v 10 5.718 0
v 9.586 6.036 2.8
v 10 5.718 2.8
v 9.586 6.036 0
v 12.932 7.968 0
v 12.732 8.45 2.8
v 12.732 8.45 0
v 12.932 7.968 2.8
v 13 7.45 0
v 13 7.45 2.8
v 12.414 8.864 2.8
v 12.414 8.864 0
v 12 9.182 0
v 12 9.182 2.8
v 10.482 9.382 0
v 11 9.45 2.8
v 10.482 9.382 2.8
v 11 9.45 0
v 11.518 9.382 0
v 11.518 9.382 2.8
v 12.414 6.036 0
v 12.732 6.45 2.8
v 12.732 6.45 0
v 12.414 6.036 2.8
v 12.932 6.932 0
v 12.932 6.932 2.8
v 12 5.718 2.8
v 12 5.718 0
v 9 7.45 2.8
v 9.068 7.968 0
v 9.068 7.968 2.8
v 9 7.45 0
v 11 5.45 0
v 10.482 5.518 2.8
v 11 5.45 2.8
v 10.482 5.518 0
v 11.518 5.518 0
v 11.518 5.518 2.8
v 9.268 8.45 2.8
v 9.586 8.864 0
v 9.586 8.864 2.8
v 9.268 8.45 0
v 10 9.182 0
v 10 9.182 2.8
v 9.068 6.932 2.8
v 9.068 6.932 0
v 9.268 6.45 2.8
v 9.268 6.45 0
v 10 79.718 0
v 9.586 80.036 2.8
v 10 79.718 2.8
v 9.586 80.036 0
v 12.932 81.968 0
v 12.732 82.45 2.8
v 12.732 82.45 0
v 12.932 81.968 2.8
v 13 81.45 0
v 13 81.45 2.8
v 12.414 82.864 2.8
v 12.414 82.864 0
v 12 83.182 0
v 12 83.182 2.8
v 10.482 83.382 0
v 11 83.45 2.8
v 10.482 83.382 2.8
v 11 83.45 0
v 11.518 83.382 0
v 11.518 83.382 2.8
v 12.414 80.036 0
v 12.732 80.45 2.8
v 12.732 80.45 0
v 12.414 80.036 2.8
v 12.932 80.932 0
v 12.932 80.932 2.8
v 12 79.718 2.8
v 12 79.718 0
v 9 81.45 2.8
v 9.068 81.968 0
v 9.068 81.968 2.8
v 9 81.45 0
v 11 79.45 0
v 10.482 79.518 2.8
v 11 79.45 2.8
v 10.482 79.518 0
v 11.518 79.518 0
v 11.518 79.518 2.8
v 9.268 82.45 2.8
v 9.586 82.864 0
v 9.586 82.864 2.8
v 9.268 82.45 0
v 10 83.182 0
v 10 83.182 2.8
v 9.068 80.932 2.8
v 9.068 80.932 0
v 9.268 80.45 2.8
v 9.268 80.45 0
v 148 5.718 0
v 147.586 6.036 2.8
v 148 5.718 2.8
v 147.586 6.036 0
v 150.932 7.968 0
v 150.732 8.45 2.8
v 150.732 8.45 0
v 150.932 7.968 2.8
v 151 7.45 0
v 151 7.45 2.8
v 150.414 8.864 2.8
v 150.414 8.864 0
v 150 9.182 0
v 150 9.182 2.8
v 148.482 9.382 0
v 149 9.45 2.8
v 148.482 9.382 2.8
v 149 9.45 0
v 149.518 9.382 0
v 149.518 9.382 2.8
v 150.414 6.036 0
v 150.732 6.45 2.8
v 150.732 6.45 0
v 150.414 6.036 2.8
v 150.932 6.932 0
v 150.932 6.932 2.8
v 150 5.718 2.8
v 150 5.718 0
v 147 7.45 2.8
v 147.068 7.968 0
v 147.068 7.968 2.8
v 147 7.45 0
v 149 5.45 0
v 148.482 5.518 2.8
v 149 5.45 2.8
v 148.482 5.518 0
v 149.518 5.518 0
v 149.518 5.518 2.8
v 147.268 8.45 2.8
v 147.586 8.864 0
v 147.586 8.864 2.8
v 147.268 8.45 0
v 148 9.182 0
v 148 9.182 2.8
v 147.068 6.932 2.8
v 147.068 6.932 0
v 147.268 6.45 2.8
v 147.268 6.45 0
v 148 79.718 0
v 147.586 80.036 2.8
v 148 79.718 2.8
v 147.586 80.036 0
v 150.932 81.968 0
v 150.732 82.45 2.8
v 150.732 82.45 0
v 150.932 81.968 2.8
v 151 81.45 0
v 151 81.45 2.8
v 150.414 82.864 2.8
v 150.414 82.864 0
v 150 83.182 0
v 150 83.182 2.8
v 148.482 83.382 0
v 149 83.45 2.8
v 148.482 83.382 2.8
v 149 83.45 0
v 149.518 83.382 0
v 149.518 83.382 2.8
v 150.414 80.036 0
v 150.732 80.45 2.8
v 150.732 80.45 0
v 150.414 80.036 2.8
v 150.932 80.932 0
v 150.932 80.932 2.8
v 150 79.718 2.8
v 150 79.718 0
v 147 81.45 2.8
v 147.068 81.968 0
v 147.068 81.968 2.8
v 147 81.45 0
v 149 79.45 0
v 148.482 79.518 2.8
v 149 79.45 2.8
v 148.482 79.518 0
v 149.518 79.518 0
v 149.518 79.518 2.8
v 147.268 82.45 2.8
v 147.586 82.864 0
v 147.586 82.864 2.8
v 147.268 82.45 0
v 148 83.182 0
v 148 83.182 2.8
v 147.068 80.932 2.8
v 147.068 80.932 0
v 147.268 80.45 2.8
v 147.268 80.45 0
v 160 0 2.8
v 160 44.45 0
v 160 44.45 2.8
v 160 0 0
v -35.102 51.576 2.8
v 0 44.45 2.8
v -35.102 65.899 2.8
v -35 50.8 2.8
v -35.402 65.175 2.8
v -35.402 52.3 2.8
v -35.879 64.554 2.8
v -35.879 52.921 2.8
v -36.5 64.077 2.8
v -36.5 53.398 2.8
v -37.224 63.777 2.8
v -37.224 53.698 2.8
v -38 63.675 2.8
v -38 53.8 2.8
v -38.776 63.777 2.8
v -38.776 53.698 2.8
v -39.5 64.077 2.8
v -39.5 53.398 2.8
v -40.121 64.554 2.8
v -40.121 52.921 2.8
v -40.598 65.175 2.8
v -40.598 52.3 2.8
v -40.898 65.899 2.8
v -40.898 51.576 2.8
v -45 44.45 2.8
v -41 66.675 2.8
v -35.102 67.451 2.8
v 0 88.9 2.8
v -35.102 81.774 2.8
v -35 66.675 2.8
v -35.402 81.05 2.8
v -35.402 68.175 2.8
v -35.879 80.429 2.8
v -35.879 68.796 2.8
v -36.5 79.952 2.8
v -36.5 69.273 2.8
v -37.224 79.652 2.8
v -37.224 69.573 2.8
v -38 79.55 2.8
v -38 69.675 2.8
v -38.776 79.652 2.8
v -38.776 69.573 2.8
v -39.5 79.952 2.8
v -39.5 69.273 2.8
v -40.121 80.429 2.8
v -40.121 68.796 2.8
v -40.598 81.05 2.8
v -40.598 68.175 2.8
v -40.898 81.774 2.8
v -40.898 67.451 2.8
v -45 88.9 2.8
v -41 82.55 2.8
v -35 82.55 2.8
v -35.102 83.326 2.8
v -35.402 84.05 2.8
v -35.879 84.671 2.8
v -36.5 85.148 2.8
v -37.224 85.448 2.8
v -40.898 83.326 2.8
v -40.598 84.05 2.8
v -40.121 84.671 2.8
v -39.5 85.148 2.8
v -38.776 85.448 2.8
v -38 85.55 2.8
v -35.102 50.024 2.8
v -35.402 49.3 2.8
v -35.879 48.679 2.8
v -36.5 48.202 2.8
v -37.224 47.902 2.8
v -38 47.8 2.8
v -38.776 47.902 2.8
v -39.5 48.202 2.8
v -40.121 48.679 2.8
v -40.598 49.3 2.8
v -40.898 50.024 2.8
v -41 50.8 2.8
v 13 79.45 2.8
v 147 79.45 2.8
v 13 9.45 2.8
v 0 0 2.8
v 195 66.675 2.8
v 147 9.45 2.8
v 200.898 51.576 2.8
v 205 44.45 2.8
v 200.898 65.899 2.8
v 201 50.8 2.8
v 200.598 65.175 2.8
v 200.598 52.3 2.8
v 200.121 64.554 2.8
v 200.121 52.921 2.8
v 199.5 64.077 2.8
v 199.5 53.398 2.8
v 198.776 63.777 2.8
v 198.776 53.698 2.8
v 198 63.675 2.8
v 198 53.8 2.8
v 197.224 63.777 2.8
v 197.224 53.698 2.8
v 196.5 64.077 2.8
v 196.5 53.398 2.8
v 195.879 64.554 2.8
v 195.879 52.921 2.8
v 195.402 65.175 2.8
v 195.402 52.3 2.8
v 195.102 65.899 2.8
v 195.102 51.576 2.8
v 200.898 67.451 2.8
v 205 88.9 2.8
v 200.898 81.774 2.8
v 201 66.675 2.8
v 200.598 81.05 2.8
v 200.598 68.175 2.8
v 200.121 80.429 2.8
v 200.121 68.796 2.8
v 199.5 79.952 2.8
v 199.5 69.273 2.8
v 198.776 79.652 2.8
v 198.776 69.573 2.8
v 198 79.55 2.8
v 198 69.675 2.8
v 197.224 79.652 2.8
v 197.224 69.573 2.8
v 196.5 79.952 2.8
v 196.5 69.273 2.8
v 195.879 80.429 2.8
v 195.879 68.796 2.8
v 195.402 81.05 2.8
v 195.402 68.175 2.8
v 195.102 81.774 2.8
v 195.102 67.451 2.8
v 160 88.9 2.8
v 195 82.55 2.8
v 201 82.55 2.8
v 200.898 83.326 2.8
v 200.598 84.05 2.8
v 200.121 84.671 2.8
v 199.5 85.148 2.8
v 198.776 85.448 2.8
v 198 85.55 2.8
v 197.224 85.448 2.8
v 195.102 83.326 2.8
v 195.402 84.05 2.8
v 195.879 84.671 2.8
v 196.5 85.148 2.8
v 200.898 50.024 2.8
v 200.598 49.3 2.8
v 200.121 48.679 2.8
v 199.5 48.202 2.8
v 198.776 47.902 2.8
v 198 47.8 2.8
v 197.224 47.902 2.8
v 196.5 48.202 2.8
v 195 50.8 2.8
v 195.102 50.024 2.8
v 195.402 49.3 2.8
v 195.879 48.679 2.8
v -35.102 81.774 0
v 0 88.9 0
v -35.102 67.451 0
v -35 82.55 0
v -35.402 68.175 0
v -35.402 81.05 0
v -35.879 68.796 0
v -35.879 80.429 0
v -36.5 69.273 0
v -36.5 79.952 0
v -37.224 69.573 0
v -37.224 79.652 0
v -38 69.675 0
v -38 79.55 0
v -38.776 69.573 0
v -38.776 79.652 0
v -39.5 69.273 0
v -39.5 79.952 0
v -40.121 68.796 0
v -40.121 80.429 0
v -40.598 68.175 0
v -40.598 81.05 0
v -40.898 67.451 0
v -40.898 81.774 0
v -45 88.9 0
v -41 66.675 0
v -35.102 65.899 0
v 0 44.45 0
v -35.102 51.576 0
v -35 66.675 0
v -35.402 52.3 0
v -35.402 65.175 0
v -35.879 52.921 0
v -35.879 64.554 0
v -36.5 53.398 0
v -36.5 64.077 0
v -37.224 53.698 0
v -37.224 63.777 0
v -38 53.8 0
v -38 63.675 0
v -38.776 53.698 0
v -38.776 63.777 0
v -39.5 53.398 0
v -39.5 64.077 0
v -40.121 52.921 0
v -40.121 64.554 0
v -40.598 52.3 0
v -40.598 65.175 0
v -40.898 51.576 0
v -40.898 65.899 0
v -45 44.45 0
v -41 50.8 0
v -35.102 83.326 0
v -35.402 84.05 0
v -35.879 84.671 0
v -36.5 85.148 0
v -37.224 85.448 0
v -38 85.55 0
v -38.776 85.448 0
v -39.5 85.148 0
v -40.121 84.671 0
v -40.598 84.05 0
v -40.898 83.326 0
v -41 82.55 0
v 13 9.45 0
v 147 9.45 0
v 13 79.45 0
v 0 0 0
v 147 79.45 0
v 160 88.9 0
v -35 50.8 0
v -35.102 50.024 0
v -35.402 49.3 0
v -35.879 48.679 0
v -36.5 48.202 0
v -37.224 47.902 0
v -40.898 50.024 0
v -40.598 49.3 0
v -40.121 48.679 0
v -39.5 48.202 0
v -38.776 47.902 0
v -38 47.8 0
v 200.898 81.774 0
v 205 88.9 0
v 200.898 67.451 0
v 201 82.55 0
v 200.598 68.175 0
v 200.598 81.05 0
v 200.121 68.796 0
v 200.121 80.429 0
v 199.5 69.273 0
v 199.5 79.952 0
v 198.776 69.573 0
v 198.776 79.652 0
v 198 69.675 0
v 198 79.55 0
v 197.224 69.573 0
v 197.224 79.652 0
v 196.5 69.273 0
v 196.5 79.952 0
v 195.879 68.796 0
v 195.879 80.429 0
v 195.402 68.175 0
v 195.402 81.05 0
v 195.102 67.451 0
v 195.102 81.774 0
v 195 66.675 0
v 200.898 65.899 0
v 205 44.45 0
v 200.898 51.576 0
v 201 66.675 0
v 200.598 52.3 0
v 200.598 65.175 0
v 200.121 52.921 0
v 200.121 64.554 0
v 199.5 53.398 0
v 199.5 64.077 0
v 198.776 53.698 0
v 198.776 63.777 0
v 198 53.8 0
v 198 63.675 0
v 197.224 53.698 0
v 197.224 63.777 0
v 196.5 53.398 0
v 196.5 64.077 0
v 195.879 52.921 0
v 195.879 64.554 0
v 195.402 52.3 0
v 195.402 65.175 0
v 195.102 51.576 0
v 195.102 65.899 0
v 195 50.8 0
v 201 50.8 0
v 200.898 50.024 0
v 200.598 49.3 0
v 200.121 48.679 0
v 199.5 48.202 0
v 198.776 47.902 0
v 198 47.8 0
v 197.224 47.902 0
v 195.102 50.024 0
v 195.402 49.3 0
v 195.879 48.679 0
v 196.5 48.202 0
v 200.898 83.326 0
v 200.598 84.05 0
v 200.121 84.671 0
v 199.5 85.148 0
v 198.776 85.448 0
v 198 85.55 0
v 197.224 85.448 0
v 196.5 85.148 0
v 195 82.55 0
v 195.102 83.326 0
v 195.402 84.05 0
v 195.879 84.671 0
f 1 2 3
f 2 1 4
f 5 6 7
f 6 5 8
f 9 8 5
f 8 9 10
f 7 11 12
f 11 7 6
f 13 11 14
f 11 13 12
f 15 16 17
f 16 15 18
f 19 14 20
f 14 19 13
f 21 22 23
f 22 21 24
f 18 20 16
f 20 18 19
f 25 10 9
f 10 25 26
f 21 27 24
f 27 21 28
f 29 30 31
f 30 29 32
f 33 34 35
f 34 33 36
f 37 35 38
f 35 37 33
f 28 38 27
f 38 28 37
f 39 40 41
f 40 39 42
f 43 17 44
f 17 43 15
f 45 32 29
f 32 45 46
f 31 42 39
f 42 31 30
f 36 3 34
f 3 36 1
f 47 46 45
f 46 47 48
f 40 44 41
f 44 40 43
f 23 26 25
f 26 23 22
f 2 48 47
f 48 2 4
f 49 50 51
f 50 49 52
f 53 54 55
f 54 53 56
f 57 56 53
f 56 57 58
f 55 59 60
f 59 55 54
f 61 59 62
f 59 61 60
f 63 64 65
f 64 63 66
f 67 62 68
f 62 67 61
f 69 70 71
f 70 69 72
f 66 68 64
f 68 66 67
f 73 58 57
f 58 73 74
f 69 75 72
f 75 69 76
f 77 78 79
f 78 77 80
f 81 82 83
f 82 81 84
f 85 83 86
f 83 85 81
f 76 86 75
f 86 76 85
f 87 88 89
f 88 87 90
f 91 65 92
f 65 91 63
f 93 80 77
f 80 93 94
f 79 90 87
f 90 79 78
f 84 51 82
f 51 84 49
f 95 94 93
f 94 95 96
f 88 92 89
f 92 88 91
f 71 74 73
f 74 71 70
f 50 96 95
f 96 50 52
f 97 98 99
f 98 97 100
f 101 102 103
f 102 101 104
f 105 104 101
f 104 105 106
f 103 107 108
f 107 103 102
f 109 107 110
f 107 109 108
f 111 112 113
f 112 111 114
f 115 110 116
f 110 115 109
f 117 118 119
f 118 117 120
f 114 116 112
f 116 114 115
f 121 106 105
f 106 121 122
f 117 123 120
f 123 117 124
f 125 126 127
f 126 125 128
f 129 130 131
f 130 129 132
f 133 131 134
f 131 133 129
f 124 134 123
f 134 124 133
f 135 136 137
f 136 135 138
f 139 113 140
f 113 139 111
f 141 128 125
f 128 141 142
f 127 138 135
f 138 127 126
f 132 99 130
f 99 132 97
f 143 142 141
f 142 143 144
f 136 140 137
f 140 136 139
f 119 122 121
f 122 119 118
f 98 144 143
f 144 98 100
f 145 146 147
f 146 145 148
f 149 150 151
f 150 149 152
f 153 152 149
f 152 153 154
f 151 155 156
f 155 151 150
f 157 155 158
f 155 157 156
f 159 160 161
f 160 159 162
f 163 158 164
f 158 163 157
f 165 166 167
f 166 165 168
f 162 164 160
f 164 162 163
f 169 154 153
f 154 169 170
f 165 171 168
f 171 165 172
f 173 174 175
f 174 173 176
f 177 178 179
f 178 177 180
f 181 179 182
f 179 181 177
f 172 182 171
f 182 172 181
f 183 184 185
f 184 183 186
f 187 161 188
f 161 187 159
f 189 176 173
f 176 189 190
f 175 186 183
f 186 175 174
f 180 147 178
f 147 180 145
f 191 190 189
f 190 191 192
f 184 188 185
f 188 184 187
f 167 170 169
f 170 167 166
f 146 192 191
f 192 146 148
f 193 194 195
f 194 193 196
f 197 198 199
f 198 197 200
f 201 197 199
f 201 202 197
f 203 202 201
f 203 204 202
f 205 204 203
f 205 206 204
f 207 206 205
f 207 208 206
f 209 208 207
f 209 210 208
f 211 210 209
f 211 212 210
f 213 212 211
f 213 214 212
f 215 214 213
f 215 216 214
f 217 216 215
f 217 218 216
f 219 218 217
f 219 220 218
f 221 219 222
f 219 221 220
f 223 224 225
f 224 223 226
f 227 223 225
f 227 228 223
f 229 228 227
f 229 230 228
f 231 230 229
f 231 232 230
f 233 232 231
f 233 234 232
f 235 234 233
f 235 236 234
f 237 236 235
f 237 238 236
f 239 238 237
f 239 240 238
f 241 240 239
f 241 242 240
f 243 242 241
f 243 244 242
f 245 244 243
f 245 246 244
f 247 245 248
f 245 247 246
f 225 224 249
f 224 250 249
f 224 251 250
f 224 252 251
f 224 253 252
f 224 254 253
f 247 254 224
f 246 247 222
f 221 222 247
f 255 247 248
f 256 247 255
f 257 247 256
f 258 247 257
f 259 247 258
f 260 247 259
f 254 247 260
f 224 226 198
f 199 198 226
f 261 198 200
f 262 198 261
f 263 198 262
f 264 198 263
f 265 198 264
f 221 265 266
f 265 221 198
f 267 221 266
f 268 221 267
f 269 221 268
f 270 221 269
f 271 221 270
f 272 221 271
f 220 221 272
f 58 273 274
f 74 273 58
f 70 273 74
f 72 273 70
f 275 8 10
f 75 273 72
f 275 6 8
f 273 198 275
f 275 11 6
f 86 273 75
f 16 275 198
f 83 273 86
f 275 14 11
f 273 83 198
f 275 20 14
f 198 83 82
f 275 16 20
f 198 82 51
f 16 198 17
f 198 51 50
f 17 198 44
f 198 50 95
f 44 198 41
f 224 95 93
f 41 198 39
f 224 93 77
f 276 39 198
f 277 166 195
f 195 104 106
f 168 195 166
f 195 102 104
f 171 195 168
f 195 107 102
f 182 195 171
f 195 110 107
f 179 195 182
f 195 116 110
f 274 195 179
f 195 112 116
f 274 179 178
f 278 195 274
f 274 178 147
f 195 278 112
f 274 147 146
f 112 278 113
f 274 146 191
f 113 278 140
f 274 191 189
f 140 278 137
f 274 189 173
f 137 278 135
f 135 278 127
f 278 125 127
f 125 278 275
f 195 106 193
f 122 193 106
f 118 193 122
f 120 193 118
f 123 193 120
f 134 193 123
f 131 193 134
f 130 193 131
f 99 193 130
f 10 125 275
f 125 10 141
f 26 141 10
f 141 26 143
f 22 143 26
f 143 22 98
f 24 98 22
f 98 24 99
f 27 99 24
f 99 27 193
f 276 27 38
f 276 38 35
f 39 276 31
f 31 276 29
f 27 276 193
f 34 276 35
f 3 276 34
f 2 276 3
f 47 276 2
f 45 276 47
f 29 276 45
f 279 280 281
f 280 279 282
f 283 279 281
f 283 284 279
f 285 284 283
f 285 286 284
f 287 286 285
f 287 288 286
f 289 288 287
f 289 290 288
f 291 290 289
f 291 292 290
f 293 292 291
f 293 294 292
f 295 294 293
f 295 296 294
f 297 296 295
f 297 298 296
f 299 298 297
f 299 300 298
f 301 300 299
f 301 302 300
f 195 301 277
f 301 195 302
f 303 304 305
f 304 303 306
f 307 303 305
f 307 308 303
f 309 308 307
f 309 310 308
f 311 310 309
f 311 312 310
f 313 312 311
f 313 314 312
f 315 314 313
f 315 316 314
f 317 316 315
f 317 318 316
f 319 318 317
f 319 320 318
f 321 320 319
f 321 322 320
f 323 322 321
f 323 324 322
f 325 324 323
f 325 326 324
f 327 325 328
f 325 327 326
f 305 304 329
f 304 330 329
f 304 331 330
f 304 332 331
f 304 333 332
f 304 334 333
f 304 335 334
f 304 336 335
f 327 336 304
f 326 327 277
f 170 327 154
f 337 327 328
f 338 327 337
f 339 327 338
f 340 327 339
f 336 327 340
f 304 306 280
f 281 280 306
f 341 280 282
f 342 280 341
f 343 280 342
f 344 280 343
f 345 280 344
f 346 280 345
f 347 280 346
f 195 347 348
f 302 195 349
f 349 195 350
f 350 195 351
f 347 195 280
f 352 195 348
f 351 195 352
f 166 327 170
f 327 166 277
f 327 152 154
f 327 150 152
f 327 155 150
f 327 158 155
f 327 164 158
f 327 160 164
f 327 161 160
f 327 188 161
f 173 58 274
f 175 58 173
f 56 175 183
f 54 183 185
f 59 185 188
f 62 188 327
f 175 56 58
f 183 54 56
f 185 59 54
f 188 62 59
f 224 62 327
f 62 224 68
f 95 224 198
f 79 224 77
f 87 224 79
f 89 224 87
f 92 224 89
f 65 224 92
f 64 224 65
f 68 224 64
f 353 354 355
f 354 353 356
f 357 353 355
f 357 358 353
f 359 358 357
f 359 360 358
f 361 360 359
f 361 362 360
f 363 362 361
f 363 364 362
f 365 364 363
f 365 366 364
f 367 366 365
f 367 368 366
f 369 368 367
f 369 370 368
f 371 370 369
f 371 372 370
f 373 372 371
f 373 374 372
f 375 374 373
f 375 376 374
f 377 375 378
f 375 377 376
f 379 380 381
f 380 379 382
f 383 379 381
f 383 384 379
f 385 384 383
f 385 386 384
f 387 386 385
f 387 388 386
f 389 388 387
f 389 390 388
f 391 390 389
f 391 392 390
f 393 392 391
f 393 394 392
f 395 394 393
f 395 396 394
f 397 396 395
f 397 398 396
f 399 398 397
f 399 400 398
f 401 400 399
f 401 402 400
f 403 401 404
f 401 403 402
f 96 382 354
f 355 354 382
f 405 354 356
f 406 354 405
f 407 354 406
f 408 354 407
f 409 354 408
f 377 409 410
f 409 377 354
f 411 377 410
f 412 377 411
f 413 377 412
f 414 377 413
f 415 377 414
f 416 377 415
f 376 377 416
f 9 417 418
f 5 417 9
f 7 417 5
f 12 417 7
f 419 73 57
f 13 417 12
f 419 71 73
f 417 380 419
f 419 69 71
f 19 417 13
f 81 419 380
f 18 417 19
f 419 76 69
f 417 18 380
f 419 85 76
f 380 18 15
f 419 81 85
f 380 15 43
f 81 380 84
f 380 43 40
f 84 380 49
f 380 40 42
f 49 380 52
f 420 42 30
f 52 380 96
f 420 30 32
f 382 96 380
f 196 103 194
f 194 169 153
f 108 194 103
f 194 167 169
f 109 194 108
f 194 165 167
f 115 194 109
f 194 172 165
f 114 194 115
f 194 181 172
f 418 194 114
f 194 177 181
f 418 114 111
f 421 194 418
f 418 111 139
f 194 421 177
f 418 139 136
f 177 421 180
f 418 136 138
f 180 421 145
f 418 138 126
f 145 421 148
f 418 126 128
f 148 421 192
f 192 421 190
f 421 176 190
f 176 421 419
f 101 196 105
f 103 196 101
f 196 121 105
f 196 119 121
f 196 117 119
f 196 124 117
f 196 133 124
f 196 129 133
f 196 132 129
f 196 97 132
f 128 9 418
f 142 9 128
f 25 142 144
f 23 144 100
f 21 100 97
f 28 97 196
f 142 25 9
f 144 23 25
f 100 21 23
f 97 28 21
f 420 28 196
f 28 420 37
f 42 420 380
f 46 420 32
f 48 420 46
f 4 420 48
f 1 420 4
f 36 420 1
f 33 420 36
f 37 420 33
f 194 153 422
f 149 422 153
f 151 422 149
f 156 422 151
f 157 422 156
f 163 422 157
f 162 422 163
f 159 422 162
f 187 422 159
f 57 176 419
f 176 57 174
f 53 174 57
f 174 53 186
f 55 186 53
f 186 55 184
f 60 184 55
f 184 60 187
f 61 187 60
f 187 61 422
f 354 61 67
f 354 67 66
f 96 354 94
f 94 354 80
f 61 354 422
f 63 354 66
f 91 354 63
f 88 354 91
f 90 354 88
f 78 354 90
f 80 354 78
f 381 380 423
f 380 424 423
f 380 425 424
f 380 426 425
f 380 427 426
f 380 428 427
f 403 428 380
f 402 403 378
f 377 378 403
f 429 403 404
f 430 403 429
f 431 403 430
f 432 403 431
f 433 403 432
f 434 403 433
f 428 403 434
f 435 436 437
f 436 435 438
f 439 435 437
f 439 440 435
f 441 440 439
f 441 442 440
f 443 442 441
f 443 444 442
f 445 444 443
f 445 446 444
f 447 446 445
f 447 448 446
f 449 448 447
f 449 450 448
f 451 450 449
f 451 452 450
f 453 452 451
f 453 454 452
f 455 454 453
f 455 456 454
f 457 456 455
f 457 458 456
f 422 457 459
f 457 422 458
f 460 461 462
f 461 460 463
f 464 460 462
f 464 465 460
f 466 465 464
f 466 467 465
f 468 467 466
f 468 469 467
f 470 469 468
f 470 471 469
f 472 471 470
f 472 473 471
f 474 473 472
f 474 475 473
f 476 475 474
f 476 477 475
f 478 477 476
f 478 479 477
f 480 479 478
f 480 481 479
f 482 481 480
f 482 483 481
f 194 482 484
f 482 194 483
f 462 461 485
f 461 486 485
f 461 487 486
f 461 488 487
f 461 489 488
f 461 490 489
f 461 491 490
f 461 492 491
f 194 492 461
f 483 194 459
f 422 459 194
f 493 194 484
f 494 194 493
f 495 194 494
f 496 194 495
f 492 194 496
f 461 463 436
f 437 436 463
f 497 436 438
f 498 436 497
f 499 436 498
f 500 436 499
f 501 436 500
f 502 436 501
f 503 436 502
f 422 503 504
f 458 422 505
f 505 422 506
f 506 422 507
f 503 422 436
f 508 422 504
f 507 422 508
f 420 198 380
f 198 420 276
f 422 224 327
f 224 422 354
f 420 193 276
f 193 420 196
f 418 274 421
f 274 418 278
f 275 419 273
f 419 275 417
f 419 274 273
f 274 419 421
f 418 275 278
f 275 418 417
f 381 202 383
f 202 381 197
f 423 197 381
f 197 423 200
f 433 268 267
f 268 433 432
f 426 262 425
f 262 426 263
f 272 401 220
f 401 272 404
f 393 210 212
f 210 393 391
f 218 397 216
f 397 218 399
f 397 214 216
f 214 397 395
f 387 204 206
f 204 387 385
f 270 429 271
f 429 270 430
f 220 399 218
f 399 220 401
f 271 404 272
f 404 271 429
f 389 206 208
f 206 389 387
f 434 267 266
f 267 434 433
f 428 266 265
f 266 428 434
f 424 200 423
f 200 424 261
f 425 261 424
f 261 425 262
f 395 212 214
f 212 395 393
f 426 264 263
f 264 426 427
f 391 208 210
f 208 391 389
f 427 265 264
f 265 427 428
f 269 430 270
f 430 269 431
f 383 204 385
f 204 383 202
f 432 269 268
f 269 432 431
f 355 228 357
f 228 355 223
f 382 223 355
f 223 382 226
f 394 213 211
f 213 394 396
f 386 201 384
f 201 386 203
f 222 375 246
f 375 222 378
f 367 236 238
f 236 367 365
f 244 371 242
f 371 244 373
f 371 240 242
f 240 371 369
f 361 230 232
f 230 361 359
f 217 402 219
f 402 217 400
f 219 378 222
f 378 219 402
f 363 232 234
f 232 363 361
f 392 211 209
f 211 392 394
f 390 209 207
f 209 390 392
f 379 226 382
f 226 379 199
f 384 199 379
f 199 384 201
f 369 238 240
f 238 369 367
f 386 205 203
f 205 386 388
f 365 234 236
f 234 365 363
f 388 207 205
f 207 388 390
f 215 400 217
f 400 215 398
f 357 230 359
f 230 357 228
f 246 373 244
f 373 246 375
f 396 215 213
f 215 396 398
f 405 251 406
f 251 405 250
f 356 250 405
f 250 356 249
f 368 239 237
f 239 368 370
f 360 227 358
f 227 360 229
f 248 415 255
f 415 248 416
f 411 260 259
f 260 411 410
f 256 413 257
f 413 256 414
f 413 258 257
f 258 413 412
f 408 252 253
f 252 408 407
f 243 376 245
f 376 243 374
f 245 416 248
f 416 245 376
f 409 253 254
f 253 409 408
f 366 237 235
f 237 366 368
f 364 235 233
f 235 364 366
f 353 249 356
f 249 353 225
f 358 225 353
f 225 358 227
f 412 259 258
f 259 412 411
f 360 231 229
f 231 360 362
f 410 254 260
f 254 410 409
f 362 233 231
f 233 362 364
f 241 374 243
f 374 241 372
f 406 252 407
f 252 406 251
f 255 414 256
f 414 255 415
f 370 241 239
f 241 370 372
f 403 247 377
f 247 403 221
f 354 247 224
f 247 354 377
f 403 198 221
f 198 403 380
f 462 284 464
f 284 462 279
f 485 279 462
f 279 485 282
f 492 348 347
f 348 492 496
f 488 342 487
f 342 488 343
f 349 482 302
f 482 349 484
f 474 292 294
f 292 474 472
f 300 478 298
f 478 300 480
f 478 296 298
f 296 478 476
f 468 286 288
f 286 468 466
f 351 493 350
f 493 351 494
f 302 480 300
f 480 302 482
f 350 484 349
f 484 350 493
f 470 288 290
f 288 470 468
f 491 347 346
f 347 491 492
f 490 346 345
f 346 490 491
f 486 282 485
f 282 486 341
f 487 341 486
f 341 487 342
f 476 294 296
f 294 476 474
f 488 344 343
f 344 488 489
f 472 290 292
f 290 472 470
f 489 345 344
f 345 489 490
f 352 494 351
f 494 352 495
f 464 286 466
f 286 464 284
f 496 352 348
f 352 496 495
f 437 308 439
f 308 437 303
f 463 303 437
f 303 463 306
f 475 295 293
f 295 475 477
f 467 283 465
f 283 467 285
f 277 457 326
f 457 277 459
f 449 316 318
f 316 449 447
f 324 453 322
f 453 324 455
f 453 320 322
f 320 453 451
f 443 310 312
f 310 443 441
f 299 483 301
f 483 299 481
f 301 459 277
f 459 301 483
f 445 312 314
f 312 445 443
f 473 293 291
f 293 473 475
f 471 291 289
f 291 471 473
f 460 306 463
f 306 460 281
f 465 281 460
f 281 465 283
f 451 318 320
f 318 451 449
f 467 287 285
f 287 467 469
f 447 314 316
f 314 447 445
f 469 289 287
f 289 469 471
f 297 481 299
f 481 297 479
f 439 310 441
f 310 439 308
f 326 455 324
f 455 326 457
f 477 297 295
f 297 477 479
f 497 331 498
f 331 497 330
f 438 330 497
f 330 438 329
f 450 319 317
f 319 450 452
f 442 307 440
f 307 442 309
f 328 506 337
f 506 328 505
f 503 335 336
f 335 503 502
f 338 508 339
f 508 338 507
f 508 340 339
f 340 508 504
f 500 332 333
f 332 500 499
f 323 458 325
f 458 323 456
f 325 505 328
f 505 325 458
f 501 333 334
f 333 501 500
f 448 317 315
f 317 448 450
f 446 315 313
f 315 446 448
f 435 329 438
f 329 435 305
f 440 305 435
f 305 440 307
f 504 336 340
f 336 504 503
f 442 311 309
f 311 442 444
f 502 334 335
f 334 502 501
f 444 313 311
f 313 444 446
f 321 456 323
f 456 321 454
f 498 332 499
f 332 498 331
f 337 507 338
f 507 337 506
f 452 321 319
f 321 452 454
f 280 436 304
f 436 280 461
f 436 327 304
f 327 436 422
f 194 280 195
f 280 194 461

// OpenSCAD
// === Parameters ===
plate_thickness = 2.8;
faceplate_width = 160;
faceplate_height = 88.9;  // 2U

rack_total_width = 250; // 10" rack
side_extension = (rack_total_width - faceplate_width) / 2;
rack_post_hole_offset = 7;

rack_flange_height = 44.45; // 1U
rack_flange_depth = 20;
rack_hole_radius = 3;
rack_hole_y = [6.35, 22.225, 38.1];

psu_width = 150;
psu_height = 86;
psu_hole_offset = 6;
psu_hole_x = [psu_hole_offset, psu_width - psu_hole_offset];
psu_hole_y = [psu_hole_offset, psu_height - psu_hole_offset];
psu_hole_radius = 2;

faceplate_padding_x = (faceplate_width - psu_width) / 2;
faceplate_padding_y = (faceplate_height - psu_height) / 2;

// === Modules ===

// Rack flange with mounting holes
module rack_flange(side = "left") {
    x_pos = (side == "left") ? -side_extension : faceplate_width;
    y_pos = faceplate_height - rack_flange_height;
    x_offset = (side == "left") ? rack_post_hole_offset : side_extension - rack_post_hole_offset;

    translate([x_pos, y_pos, 0])
    difference() {
        cube([side_extension, rack_flange_height, plate_thickness]);
        for (y = rack_hole_y)
            translate([x_offset, y, -1])
                cylinder(h = plate_thickness + 2, r = rack_hole_radius, $fn = 24);
    }
}

// Main PSU face bracket with open center
module psu_face_bracket_frame() {
    outer_w = faceplate_width;
    outer_h = faceplate_height;

    frame_border = 8;

    inner_w = psu_width - frame_border * 2;
    inner_h = psu_height - frame_border * 2;

    inner_x = faceplate_padding_x + frame_border;
    inner_y = faceplate_padding_y + frame_border;

    difference() {
        // Full front plate
        cube([outer_w, outer_h, plate_thickness]);

        // Large central cutout
        translate([inner_x, inner_y, -1])
            cube([inner_w, inner_h, plate_thickness + 2]);

        // PSU mounting holes
        for (x = psu_hole_x)
            for (y = psu_hole_y)
                translate([faceplate_padding_x + x, faceplate_padding_y + y, -1])
                    cylinder(h = plate_thickness + 2, r = psu_hole_radius, $fn = 24);
    }

    // Rack flanges & gussets
    rack_flange("left");
    rack_flange("right");
}

// === Run it ===
psu_face_bracket_frame();
